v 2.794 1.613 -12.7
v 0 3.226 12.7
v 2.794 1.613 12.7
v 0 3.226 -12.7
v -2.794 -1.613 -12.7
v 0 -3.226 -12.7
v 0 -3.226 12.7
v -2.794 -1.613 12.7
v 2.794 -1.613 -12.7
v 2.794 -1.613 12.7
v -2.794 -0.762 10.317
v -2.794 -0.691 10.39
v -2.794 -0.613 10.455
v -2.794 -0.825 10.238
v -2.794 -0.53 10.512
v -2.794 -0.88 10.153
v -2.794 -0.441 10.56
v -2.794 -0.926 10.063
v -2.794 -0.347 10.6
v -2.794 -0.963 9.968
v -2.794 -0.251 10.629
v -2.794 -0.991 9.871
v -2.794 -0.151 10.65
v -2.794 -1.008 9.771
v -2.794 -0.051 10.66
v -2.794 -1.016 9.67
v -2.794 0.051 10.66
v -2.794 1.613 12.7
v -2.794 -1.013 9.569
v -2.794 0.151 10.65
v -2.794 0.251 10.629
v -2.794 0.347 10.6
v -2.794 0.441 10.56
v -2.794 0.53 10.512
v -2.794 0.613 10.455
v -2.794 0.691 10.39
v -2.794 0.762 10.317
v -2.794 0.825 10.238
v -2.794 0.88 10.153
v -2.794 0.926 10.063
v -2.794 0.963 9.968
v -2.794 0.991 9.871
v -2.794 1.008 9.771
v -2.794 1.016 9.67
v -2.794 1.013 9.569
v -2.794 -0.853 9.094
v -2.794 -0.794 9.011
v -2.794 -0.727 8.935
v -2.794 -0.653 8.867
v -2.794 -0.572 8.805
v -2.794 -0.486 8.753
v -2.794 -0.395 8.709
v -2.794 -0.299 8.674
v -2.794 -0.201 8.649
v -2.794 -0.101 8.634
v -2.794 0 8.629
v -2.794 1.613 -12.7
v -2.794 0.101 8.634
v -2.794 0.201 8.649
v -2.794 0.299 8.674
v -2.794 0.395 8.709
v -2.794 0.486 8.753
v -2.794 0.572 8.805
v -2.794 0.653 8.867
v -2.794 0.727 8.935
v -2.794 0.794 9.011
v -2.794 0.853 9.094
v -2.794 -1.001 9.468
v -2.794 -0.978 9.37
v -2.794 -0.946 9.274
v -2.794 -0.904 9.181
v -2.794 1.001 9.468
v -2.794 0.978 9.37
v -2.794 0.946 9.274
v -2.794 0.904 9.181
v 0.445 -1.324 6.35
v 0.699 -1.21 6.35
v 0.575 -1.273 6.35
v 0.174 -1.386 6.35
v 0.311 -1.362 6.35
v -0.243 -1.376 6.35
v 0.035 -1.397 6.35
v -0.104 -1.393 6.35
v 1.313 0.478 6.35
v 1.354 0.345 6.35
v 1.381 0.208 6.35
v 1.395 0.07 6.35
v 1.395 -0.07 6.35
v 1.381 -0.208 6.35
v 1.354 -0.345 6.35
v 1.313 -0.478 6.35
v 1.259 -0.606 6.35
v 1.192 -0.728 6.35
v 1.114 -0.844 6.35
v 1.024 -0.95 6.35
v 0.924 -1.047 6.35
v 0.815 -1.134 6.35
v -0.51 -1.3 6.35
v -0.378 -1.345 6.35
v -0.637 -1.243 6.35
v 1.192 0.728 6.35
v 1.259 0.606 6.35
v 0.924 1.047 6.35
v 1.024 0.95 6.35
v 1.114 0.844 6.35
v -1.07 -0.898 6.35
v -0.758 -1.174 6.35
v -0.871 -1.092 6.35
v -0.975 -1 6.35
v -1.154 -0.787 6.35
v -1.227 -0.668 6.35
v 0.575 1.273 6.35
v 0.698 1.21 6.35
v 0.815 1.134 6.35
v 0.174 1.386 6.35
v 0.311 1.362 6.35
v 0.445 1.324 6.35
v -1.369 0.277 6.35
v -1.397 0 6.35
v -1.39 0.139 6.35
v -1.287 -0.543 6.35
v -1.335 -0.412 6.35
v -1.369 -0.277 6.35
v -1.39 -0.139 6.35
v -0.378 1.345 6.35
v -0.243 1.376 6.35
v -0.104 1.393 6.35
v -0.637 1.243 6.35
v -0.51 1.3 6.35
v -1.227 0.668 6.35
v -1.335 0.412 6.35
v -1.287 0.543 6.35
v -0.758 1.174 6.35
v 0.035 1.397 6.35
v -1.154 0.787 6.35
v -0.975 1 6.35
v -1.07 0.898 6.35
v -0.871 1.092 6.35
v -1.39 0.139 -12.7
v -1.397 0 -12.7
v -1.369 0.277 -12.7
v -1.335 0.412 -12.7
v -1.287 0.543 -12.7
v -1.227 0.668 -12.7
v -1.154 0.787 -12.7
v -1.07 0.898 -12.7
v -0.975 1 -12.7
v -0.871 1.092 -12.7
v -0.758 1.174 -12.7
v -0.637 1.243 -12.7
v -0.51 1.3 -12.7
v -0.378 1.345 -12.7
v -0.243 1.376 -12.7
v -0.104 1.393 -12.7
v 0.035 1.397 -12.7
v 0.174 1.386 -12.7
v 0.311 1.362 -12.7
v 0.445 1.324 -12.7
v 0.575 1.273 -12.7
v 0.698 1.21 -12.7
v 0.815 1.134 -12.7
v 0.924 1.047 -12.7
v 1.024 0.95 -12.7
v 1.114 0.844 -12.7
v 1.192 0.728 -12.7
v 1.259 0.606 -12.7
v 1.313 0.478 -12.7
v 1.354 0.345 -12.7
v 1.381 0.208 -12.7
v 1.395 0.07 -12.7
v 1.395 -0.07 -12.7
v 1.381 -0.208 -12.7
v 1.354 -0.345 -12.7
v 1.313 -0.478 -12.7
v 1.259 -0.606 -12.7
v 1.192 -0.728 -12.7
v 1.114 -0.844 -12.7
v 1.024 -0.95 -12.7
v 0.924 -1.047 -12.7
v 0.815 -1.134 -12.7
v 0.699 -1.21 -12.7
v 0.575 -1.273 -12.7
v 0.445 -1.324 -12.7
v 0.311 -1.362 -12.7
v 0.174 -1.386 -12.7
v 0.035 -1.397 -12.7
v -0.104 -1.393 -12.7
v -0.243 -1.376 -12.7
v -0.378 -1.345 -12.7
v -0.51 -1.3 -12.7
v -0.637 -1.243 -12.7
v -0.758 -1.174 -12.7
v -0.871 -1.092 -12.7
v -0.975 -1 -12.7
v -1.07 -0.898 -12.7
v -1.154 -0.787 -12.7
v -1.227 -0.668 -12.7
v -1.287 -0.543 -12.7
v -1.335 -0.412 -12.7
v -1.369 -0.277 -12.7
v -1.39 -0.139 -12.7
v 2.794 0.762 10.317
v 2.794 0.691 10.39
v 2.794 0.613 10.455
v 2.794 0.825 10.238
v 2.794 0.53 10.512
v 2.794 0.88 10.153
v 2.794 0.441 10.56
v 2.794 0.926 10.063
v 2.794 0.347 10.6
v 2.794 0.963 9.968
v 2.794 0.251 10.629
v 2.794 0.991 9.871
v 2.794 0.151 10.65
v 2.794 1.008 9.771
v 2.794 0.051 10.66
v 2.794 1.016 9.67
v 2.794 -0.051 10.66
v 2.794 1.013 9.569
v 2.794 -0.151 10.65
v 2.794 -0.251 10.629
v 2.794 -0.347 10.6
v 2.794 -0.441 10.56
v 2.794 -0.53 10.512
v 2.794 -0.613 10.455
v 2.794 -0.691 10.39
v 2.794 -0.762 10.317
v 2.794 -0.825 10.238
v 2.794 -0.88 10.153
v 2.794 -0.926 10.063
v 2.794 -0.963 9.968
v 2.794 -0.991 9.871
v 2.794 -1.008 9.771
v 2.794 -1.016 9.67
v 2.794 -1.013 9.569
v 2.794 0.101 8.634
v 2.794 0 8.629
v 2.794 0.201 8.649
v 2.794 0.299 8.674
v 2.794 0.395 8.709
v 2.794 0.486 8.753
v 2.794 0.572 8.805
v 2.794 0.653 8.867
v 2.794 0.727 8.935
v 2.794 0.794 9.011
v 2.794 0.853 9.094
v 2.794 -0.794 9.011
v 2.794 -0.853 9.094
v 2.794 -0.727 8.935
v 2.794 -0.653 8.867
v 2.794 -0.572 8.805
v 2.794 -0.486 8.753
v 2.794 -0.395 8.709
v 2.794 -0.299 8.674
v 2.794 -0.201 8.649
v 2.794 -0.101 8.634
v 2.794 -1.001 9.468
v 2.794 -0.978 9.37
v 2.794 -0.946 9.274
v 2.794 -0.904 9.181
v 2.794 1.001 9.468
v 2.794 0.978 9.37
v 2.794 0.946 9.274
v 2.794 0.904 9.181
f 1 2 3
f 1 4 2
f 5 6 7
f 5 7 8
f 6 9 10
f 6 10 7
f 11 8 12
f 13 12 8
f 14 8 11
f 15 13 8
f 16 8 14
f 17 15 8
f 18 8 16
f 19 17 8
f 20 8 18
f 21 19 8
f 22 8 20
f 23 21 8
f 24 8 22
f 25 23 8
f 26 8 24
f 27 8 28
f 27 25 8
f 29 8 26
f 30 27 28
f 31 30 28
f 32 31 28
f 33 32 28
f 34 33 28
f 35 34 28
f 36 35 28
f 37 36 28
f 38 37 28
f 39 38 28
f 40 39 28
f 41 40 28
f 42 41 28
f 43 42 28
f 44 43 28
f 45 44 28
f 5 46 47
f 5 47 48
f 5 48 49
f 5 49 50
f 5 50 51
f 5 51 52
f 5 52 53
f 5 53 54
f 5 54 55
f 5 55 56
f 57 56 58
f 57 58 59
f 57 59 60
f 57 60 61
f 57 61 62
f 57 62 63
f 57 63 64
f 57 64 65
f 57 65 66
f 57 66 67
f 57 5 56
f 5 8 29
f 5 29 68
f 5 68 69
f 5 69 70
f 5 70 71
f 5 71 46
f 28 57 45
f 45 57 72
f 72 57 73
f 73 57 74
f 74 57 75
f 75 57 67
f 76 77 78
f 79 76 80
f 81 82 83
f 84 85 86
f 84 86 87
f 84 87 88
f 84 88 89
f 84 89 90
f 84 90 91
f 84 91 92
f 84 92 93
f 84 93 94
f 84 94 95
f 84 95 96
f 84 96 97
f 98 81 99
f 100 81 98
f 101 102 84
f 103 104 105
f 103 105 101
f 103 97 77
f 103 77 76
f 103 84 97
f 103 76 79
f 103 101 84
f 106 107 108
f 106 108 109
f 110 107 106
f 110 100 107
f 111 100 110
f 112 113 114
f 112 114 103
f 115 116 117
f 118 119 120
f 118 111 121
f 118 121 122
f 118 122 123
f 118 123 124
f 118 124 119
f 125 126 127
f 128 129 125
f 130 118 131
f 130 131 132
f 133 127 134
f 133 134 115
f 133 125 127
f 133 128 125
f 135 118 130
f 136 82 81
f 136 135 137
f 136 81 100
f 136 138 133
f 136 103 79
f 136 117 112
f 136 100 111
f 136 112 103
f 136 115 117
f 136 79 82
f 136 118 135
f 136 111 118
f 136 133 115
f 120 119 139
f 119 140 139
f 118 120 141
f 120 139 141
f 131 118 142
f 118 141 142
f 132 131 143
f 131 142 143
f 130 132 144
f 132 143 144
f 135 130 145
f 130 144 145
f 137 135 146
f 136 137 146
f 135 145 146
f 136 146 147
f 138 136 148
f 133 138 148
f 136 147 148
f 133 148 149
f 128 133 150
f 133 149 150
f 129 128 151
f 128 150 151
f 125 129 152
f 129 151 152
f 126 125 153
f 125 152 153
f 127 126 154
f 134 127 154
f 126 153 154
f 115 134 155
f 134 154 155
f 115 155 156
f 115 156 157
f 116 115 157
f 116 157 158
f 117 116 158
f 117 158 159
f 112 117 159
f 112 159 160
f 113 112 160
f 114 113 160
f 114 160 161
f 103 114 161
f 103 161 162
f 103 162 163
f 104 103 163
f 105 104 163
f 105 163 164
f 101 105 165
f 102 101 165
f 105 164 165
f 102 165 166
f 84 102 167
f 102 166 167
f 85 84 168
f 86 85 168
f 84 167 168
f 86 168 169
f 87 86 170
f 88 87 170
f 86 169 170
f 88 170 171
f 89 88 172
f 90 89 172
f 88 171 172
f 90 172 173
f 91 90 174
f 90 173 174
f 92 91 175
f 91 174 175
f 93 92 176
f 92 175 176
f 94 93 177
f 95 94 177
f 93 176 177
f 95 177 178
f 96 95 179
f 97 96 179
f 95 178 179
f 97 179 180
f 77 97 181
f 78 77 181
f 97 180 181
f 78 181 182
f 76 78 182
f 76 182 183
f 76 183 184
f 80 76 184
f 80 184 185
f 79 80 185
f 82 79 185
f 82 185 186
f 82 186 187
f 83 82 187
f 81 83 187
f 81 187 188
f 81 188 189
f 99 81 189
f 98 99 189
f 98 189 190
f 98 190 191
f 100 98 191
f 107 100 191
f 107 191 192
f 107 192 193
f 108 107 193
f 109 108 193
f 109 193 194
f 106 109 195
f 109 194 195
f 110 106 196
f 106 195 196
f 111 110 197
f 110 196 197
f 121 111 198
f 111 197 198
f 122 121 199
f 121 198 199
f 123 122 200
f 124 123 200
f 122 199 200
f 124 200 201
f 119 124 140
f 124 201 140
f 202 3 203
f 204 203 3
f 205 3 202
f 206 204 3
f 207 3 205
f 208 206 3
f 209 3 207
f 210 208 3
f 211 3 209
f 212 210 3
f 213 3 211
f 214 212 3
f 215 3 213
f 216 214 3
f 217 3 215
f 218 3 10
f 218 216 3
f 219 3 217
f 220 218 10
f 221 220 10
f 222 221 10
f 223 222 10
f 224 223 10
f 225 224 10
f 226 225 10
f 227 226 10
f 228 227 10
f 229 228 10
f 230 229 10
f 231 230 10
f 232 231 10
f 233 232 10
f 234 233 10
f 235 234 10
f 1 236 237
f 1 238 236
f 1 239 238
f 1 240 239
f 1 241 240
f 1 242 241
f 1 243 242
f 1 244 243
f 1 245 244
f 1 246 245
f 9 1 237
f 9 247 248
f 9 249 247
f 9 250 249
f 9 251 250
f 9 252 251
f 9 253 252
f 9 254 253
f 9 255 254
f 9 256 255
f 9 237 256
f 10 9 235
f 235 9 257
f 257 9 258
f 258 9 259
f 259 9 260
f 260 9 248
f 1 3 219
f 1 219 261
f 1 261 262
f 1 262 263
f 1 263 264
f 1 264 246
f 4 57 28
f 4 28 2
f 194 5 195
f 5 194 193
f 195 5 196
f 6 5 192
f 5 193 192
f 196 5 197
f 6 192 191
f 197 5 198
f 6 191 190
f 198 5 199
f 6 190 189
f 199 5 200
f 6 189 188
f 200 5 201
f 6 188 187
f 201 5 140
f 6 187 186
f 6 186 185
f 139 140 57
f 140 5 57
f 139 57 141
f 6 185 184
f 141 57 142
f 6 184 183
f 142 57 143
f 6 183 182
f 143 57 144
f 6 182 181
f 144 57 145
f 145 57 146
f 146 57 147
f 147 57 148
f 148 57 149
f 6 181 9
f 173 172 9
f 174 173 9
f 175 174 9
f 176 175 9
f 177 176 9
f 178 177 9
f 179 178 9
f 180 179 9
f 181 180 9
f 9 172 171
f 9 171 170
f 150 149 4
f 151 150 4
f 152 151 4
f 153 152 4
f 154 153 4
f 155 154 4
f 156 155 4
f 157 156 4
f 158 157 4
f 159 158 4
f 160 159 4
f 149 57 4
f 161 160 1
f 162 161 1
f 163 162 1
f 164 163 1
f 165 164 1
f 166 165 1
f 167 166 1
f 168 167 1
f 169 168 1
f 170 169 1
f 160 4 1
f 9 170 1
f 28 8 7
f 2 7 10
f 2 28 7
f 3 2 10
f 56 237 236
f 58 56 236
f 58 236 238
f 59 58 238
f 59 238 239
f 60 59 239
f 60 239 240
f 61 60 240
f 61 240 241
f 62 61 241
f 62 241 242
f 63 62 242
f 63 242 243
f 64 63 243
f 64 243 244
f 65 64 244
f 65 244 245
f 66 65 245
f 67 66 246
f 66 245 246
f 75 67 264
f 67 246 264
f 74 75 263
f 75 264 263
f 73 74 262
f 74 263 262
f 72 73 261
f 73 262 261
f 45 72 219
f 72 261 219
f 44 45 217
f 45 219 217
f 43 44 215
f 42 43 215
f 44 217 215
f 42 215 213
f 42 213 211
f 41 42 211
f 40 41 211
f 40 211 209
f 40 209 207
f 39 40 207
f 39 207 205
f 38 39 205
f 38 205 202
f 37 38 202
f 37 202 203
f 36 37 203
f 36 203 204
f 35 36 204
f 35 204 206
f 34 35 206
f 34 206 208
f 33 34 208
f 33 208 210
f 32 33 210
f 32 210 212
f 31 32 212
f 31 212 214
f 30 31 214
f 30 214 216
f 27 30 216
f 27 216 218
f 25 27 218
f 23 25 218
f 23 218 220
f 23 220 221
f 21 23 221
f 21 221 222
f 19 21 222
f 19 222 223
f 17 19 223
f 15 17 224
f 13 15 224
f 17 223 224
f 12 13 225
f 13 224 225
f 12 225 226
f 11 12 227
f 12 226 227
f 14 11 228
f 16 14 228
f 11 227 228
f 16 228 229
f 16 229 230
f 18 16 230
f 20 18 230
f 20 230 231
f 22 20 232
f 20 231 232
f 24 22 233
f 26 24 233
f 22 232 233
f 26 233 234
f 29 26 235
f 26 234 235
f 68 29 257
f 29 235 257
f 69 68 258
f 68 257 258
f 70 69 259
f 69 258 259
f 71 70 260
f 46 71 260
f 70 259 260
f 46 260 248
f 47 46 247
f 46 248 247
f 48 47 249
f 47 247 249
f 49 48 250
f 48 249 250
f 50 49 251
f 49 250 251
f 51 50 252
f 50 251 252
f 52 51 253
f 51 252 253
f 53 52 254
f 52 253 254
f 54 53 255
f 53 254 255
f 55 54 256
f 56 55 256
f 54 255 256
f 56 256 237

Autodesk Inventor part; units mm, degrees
ref_plane "YZ Plane" through (0, 0, 0) normal (1, 0, 0) x (0, 1, 0)
ref_plane "XZ Plane" through (0, 0, 0) normal (0, 1, 0) x (-1, 0, 0)
ref_plane "XY Plane" through (0, 0, 0) normal (0, 0, 1) x (1, 0, 0)
sketch "Sketch1" plane through (0, 0, 0) normal (0, 0, 1) x (1, 0, 0)
  line L0 (2.794, -1.6131) -> (0, -3.2262)
  line L1 (0, -3.2262) -> (-2.794, -1.6131)
  line L2 (-2.794, -1.6131) -> (-2.794, 1.6131)
  line L3 (-2.794, 1.6131) -> (0, 3.2262)
  line L4 (0, 3.2262) -> (2.794, 1.6131)
  line L5 (2.794, 1.6131) -> (2.794, -1.6131)
  point P0 (0, 0)
  point P1 (0, 0)
  point P2 (2.794, 0)
  dimension "d0" = 5.588
extrude "Extrusion1" add sketch "Sketch1" along normal mid plane 25.4
sketch "Sketch2" plane through (2.794, -1.6131, 12.7) normal (1, 0, 0) x (0, 0, -1)
  line L0 (0, 0) -> (0, 3.2262) construction
  circle A0 centre (3.0551, 1.6131) radius 1.016
  point P0 (12.7, 1.6131)
  dimension "d3" = 2.032
  dimension "d4" = 3.0551
extrude "Extrusion2" cut sketch "Sketch2" against normal through all
sketch "Sketch3" plane through (0, 0, -12.7) normal (0, 0, -1) x (-1, 0, 0)
  circle A0 centre (0, 0) radius 1.397
  dimension "d9" = 2.794
extrude "Extrusion3" cut sketch "Sketch3" against normal blind 19.05
properties part number "tensioners"
